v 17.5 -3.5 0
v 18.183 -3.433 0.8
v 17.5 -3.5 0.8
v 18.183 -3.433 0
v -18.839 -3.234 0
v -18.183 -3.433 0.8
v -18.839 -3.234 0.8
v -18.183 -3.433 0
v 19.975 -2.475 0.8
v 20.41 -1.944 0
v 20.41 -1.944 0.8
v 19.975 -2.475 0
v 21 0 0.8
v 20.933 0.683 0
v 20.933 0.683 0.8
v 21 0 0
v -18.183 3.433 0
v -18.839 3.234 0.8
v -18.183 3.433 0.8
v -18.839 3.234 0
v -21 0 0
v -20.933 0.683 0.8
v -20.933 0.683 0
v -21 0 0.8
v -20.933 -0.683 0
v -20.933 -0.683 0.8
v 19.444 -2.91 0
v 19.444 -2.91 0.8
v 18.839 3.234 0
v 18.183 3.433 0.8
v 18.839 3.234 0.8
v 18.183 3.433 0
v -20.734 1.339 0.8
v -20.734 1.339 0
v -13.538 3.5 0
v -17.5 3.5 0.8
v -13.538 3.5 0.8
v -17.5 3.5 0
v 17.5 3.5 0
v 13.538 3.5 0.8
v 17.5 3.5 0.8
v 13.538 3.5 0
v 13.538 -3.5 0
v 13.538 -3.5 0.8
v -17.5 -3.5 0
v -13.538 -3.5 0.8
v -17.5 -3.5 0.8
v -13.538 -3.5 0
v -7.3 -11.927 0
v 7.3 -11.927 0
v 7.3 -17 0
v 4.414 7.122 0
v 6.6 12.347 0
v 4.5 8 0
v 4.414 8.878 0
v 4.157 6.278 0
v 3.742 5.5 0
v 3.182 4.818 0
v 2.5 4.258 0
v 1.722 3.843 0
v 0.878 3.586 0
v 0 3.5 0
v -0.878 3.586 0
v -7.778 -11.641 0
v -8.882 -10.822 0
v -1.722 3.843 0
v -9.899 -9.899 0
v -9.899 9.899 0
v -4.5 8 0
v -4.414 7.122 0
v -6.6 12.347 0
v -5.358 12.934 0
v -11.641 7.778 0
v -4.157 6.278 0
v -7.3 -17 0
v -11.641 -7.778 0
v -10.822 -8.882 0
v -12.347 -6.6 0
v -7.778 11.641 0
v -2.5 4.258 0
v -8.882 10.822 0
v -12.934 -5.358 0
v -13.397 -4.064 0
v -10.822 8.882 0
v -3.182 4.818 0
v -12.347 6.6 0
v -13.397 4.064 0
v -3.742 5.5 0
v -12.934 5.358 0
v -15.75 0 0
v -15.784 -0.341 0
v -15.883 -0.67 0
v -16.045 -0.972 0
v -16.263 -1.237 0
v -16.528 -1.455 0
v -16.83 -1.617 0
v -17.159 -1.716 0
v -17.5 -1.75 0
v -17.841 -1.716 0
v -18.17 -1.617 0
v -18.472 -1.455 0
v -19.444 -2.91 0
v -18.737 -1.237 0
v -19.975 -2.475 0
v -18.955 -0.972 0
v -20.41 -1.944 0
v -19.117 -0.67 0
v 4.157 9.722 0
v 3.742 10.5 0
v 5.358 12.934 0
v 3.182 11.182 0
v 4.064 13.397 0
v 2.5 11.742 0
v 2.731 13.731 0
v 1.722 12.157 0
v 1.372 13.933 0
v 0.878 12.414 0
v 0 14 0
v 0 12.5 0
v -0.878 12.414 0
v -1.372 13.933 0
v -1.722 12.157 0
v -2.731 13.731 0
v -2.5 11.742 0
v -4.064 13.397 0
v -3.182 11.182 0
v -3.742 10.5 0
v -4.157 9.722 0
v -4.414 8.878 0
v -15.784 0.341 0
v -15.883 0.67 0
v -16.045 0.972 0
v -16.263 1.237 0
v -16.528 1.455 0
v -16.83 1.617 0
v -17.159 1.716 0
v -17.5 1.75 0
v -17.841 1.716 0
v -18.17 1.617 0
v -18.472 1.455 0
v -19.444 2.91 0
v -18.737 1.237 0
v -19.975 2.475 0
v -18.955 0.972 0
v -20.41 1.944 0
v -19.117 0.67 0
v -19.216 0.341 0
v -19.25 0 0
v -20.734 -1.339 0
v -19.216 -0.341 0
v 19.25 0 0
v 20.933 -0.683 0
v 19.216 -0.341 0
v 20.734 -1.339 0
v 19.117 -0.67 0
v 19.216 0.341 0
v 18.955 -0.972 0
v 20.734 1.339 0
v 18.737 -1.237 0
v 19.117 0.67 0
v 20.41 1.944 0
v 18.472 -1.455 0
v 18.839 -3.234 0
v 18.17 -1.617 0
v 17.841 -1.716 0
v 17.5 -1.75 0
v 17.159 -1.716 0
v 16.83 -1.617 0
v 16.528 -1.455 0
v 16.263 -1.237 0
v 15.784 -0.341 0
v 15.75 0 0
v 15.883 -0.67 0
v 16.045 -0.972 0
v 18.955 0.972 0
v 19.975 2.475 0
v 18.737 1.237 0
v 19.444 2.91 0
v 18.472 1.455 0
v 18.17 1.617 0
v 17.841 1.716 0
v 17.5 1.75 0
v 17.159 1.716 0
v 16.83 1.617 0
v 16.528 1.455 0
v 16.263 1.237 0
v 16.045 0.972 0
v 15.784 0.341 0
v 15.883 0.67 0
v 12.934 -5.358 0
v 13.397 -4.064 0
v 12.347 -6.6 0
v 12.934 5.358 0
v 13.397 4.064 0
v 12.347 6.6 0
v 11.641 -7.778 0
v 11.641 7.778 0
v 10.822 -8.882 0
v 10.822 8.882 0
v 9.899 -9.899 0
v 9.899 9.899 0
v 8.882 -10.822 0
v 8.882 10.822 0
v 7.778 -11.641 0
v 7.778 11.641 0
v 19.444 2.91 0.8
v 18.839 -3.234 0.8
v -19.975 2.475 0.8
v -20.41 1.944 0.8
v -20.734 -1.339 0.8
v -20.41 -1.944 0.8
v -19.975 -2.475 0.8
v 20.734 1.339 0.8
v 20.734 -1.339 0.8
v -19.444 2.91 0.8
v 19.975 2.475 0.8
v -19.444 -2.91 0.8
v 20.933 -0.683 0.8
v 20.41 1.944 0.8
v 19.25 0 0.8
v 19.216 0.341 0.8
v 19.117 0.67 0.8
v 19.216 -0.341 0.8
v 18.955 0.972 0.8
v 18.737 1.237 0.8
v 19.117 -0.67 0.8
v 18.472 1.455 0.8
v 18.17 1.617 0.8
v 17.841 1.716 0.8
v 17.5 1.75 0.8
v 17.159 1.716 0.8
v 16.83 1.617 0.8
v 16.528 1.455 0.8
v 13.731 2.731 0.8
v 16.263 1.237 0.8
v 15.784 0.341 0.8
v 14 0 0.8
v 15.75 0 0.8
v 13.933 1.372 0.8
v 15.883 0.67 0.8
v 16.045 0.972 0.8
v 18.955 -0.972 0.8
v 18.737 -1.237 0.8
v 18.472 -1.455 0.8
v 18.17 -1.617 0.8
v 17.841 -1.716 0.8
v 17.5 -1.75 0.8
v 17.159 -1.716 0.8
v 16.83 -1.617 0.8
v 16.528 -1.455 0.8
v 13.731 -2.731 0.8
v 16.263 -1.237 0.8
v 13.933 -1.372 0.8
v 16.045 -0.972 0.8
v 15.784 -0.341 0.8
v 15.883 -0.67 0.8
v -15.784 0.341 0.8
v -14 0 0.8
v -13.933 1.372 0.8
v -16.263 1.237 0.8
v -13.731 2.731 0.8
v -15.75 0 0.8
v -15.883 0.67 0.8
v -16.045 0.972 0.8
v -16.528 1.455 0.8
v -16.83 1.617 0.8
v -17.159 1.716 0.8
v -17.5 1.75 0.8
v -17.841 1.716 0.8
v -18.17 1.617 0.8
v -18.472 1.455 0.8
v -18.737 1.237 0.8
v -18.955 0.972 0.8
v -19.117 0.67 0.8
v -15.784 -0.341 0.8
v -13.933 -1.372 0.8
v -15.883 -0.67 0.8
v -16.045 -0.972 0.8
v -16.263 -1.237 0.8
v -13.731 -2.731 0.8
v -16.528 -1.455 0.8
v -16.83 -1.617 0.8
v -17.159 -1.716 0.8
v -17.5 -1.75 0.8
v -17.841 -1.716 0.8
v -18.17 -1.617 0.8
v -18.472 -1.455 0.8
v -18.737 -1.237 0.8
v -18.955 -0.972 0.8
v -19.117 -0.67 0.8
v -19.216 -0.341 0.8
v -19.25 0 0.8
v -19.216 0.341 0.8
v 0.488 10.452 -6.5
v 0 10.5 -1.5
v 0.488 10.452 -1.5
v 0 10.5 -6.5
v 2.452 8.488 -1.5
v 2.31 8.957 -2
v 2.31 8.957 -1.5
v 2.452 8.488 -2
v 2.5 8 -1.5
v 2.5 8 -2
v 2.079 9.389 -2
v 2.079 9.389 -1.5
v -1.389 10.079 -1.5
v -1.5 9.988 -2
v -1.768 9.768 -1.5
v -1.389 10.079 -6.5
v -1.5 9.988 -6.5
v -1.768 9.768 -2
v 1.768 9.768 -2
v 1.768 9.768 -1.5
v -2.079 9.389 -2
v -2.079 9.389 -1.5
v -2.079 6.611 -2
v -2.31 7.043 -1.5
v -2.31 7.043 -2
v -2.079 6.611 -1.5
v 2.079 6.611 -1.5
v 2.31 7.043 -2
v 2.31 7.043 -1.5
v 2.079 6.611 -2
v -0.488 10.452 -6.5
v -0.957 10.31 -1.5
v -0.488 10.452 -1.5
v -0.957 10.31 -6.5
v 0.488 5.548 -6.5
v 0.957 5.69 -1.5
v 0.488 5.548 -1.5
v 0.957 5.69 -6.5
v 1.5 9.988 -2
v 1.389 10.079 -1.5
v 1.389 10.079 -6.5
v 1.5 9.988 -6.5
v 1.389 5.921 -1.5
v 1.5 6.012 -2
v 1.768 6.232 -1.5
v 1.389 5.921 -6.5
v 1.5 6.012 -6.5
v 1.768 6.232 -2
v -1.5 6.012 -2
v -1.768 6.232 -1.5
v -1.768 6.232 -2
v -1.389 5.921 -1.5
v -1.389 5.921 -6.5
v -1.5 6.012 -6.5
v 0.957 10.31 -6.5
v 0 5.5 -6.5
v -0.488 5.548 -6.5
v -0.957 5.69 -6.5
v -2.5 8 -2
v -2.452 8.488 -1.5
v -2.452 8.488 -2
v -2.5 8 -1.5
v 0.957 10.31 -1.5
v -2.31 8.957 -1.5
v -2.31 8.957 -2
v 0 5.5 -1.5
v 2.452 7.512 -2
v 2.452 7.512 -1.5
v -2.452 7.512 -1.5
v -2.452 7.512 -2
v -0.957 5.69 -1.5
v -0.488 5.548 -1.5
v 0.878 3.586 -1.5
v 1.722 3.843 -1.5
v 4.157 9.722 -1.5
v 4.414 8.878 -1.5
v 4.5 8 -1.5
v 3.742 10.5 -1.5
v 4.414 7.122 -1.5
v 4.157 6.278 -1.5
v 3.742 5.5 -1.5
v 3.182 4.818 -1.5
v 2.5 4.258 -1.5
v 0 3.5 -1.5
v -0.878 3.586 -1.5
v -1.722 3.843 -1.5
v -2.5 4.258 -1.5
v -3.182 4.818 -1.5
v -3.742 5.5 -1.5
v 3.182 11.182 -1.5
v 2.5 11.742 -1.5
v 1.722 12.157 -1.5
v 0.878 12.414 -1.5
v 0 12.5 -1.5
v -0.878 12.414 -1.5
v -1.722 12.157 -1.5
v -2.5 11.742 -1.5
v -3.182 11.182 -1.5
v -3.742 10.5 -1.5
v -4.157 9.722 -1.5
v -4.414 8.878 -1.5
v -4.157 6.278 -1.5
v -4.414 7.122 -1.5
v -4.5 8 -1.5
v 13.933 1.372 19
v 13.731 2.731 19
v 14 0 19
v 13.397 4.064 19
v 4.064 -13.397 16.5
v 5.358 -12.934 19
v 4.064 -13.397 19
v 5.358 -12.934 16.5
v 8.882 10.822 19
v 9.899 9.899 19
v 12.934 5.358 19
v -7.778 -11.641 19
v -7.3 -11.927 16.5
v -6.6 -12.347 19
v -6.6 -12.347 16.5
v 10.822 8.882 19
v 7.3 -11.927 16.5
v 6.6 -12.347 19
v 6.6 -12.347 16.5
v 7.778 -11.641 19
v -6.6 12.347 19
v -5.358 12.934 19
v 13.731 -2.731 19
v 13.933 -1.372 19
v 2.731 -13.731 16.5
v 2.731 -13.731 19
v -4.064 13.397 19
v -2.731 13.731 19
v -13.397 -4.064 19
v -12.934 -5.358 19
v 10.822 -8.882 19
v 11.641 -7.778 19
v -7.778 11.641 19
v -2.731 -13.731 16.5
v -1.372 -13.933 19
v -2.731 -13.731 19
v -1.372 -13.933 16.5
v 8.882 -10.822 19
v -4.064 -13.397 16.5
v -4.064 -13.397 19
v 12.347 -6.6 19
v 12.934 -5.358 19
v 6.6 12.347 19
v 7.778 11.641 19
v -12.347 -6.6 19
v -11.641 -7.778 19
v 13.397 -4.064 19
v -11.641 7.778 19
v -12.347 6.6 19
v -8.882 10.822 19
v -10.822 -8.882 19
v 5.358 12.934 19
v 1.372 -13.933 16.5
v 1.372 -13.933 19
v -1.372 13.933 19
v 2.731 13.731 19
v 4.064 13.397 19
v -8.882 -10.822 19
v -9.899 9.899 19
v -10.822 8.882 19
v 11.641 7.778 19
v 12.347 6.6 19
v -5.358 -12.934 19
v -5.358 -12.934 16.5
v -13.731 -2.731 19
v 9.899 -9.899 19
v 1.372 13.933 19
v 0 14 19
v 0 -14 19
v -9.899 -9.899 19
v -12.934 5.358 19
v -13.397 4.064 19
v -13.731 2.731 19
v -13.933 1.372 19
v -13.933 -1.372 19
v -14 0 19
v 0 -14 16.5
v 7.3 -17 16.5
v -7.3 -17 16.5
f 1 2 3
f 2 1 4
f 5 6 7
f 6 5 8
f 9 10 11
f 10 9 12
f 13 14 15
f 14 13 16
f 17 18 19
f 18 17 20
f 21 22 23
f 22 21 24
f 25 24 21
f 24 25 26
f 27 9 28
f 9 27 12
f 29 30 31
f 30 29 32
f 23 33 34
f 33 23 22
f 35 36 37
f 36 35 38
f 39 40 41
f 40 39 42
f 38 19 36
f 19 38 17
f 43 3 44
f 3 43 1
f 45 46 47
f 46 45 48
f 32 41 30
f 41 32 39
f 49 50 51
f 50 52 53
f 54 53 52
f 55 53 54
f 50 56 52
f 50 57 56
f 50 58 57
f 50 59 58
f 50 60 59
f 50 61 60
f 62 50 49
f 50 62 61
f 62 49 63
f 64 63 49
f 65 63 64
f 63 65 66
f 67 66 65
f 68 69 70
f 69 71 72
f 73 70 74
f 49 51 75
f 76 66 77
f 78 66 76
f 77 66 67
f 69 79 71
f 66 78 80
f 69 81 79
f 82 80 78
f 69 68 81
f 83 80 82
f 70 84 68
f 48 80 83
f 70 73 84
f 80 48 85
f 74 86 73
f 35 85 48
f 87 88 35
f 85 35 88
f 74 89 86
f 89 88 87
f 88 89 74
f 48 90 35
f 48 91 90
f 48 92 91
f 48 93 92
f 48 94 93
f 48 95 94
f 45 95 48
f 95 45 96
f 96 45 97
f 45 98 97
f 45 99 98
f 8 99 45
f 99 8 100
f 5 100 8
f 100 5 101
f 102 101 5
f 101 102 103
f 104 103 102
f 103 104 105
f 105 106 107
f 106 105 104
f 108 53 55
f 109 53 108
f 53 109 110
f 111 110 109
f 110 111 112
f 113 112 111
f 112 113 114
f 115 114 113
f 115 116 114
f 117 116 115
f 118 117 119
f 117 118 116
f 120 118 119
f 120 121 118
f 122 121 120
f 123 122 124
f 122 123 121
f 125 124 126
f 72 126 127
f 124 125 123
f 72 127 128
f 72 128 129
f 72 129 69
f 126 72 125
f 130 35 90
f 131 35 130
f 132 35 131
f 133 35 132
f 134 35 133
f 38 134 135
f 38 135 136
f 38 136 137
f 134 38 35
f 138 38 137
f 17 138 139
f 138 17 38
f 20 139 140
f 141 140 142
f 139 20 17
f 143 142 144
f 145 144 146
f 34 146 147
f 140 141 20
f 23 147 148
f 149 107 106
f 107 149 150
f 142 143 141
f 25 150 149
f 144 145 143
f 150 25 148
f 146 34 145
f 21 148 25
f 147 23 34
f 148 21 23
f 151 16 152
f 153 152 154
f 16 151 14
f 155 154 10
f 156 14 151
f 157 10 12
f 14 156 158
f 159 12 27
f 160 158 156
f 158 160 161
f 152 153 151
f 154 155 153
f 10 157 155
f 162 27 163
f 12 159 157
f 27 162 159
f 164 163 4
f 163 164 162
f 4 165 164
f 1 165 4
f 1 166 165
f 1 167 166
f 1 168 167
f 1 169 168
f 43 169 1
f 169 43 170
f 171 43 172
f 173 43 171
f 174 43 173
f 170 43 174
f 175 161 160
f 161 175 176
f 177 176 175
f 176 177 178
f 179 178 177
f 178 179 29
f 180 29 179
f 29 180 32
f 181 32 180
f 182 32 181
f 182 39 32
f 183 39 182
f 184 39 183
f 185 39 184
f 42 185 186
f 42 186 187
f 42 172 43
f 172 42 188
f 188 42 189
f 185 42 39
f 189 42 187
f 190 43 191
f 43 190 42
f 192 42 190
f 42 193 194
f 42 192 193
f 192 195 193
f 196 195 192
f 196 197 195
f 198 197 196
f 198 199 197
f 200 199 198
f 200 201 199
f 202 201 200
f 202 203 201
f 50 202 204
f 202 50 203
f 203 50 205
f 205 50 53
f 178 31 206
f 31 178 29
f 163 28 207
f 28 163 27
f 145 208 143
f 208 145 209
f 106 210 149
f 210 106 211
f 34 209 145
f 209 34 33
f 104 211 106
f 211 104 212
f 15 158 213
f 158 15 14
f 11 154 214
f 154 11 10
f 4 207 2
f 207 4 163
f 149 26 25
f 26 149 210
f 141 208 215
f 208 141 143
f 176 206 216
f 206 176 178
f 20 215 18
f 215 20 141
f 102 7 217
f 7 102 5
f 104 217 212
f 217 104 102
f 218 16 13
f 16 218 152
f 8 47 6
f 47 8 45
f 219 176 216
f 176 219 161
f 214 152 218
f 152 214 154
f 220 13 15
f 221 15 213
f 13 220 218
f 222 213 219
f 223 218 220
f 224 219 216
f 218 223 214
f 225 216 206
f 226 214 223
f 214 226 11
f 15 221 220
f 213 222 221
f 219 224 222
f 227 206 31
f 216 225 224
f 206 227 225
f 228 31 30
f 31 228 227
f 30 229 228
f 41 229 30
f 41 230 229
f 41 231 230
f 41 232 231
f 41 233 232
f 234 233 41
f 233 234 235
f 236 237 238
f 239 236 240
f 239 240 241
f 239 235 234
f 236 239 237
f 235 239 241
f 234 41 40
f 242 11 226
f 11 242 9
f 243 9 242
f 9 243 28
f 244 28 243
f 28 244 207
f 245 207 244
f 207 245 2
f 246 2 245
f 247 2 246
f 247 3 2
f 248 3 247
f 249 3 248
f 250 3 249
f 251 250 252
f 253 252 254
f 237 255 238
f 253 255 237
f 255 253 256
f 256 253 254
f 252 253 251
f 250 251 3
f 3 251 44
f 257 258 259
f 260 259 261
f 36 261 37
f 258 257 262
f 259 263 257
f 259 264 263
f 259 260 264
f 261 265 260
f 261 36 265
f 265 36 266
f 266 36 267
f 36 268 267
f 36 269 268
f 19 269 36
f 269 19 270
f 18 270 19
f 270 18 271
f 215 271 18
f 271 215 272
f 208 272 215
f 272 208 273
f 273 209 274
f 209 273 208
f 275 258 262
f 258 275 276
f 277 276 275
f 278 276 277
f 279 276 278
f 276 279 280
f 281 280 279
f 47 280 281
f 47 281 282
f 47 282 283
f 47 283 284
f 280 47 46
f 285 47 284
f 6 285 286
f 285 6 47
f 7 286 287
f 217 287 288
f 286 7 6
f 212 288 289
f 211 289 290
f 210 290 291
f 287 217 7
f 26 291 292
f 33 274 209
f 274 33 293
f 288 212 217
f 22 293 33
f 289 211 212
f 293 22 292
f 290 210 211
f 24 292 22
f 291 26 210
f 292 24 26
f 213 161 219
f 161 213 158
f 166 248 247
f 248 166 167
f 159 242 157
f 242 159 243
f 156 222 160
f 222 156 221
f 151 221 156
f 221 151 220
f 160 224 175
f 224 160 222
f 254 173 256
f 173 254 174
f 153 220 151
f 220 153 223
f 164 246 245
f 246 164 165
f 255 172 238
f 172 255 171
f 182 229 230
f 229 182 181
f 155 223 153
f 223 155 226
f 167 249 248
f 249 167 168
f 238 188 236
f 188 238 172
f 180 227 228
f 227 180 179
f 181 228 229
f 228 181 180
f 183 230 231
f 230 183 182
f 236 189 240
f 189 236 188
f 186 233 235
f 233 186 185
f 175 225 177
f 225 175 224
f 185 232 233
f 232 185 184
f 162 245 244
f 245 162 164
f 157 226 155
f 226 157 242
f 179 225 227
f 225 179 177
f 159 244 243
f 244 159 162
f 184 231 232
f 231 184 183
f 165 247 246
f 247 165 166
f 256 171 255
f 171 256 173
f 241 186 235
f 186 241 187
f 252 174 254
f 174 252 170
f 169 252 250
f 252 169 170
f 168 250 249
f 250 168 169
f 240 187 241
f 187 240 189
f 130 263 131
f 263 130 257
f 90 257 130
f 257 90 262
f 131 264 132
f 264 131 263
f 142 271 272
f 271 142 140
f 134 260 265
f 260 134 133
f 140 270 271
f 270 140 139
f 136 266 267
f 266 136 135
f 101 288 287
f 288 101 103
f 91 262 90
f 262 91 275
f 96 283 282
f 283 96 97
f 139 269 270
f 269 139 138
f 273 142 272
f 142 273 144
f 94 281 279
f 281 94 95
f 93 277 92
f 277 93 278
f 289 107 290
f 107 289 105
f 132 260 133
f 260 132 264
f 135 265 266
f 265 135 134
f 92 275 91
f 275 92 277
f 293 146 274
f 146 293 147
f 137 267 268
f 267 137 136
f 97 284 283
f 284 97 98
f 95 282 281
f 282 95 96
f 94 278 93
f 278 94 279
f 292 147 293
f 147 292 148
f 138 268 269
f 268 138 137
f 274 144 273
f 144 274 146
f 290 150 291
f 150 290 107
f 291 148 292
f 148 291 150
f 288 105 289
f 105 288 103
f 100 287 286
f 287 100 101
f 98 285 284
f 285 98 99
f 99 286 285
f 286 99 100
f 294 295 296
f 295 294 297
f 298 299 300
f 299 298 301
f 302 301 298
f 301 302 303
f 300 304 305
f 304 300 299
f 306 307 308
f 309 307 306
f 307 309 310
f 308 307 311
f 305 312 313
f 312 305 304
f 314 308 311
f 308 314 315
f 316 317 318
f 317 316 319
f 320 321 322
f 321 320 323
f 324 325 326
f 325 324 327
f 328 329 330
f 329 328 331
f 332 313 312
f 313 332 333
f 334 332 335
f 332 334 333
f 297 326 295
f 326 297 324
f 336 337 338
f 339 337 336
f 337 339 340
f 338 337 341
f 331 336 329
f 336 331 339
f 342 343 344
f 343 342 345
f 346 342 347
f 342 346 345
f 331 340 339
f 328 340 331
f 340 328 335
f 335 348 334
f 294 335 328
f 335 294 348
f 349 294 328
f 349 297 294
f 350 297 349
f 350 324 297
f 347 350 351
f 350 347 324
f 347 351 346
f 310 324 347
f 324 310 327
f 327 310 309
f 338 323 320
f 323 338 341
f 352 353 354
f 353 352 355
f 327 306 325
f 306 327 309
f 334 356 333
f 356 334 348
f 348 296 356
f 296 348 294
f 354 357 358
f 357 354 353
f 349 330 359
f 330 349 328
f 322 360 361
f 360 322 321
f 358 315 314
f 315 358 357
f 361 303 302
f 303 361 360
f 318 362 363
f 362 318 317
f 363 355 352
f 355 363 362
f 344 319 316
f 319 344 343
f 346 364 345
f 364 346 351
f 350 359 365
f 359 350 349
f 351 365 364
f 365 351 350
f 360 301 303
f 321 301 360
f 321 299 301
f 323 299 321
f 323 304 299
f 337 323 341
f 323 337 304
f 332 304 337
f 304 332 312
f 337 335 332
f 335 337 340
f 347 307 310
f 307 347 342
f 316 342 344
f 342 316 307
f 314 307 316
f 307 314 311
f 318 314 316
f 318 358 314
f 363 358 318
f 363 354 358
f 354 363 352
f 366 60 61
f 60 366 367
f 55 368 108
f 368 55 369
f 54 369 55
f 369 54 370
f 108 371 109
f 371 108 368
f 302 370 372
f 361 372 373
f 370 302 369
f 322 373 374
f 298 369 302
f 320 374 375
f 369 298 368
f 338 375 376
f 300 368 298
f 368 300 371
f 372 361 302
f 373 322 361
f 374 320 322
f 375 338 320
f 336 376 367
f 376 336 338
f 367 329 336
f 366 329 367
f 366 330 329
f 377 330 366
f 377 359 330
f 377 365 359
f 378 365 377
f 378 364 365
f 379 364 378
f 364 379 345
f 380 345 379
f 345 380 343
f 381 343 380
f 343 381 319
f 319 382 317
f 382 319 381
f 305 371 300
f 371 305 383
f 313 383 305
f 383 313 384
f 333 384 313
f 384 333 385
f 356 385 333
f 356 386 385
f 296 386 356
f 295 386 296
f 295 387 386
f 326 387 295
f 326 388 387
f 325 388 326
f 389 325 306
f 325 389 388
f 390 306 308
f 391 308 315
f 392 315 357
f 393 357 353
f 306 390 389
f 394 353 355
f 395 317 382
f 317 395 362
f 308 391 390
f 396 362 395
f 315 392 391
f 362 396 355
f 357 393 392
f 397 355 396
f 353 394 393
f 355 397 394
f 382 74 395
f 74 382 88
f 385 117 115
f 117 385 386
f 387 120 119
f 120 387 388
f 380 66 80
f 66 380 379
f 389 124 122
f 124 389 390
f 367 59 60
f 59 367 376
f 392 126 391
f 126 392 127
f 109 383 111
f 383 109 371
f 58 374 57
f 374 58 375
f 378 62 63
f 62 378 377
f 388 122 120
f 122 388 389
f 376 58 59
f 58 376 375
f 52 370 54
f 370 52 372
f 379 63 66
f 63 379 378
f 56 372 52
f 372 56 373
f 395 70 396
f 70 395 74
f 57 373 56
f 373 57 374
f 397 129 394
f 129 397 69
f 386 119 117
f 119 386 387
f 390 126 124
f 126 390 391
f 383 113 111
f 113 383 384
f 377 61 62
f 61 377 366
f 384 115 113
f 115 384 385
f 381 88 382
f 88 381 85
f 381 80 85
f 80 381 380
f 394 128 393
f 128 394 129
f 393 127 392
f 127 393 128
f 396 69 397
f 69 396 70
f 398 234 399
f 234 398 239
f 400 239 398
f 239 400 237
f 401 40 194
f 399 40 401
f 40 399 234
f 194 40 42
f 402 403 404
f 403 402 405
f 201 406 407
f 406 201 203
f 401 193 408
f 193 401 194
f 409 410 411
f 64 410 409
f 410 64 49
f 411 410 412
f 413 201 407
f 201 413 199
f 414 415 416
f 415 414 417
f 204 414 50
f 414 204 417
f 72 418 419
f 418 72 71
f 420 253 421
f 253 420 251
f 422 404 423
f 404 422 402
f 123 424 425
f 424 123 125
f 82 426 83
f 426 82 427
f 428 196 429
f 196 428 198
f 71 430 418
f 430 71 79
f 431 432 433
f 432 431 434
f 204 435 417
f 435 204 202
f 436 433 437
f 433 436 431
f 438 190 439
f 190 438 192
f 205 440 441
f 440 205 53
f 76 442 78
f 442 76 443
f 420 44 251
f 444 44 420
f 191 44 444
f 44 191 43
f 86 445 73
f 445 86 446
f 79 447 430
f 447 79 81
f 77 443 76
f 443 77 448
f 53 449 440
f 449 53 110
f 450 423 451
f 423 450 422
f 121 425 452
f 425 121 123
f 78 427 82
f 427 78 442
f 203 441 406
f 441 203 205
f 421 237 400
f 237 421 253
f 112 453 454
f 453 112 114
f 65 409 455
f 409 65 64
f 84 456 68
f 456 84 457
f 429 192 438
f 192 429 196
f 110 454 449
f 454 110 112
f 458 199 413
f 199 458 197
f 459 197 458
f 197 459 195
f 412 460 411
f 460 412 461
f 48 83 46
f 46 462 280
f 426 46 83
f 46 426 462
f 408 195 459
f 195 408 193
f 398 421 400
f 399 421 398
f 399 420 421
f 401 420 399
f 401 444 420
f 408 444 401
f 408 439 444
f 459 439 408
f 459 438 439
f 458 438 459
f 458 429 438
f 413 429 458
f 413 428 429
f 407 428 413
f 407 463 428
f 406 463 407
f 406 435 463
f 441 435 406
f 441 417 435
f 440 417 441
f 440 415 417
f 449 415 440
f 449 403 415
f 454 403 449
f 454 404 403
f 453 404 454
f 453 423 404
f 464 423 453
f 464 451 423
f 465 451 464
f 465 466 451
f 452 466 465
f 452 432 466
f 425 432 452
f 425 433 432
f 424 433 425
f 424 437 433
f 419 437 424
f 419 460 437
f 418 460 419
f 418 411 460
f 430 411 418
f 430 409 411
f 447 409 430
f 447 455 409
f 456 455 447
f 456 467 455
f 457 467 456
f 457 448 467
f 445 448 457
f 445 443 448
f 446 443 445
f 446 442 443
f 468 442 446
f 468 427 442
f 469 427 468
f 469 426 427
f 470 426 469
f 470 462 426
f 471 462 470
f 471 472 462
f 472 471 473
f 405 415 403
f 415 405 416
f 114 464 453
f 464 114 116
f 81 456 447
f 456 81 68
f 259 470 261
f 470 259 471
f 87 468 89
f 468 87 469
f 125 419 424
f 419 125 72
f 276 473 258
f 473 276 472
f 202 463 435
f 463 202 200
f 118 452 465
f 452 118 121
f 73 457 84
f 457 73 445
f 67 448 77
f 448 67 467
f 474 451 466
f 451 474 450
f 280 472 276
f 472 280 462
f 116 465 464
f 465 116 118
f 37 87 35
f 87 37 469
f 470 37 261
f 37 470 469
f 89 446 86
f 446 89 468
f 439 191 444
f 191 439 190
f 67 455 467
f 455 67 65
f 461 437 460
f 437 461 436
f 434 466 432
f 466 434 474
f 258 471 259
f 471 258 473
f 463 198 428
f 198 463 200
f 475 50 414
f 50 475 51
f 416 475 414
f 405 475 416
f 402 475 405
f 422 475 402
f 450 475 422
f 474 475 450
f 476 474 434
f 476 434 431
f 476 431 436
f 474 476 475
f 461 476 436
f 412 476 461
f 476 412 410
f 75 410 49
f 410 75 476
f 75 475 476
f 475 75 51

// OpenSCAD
//
//  28byj-48 stepper motor from datasheet and measurements
//  Russ Hughes, russ@owt.com
//  Attribution 4.0 International (CC BY 4.0)
//

module stepper_28byj48(segments=32) {
    $fn = segments;
    module mount_tabs() {
        difference() {
            hull() {
                translate([35/2,0,0])
                    cylinder(d=7, 0.8);

                translate([-35/2,0,0])
                    cylinder(d=7, 0.8);
            }
            translate([35/2,0,-0.1])
                cylinder(d=3.5, 0.8+0.2);

            translate([-35/2,0,-0.1])
                cylinder(d=3.5, 0.8+0.2);
        }
    }

    // main body
    color("Silver")
        cylinder(d=28, h =19, $fn=$fn*2);

    // wire cover
    color("DeepSkyBlue")
        translate([-14.6/2,-17,0])
            cube([14.6,5.8, 16.5]);

    color("Silver")
        mount_tabs();

    // shaft and flange
    translate([0,0,-1.5]) {
        // flange
        translate([0,8,0])
            color("Silver")
                cylinder(d=9,h =1.5);

        color("Goldenrod") {
            // shaft
            translate([0,8,-5]) {
                difference() {
                    cylinder(d=5, h=10);

                    // shaft cutouts
                    translate([1.5,-2.5,-0.1])
                        cube([2,5,4.5+0.1]);

                    translate([-2-1.5,-2.5,-0.1])
                        cube([2,5,4.5+0.1]);
                }
            }
        }
    }
}

stepper_28byj48();
